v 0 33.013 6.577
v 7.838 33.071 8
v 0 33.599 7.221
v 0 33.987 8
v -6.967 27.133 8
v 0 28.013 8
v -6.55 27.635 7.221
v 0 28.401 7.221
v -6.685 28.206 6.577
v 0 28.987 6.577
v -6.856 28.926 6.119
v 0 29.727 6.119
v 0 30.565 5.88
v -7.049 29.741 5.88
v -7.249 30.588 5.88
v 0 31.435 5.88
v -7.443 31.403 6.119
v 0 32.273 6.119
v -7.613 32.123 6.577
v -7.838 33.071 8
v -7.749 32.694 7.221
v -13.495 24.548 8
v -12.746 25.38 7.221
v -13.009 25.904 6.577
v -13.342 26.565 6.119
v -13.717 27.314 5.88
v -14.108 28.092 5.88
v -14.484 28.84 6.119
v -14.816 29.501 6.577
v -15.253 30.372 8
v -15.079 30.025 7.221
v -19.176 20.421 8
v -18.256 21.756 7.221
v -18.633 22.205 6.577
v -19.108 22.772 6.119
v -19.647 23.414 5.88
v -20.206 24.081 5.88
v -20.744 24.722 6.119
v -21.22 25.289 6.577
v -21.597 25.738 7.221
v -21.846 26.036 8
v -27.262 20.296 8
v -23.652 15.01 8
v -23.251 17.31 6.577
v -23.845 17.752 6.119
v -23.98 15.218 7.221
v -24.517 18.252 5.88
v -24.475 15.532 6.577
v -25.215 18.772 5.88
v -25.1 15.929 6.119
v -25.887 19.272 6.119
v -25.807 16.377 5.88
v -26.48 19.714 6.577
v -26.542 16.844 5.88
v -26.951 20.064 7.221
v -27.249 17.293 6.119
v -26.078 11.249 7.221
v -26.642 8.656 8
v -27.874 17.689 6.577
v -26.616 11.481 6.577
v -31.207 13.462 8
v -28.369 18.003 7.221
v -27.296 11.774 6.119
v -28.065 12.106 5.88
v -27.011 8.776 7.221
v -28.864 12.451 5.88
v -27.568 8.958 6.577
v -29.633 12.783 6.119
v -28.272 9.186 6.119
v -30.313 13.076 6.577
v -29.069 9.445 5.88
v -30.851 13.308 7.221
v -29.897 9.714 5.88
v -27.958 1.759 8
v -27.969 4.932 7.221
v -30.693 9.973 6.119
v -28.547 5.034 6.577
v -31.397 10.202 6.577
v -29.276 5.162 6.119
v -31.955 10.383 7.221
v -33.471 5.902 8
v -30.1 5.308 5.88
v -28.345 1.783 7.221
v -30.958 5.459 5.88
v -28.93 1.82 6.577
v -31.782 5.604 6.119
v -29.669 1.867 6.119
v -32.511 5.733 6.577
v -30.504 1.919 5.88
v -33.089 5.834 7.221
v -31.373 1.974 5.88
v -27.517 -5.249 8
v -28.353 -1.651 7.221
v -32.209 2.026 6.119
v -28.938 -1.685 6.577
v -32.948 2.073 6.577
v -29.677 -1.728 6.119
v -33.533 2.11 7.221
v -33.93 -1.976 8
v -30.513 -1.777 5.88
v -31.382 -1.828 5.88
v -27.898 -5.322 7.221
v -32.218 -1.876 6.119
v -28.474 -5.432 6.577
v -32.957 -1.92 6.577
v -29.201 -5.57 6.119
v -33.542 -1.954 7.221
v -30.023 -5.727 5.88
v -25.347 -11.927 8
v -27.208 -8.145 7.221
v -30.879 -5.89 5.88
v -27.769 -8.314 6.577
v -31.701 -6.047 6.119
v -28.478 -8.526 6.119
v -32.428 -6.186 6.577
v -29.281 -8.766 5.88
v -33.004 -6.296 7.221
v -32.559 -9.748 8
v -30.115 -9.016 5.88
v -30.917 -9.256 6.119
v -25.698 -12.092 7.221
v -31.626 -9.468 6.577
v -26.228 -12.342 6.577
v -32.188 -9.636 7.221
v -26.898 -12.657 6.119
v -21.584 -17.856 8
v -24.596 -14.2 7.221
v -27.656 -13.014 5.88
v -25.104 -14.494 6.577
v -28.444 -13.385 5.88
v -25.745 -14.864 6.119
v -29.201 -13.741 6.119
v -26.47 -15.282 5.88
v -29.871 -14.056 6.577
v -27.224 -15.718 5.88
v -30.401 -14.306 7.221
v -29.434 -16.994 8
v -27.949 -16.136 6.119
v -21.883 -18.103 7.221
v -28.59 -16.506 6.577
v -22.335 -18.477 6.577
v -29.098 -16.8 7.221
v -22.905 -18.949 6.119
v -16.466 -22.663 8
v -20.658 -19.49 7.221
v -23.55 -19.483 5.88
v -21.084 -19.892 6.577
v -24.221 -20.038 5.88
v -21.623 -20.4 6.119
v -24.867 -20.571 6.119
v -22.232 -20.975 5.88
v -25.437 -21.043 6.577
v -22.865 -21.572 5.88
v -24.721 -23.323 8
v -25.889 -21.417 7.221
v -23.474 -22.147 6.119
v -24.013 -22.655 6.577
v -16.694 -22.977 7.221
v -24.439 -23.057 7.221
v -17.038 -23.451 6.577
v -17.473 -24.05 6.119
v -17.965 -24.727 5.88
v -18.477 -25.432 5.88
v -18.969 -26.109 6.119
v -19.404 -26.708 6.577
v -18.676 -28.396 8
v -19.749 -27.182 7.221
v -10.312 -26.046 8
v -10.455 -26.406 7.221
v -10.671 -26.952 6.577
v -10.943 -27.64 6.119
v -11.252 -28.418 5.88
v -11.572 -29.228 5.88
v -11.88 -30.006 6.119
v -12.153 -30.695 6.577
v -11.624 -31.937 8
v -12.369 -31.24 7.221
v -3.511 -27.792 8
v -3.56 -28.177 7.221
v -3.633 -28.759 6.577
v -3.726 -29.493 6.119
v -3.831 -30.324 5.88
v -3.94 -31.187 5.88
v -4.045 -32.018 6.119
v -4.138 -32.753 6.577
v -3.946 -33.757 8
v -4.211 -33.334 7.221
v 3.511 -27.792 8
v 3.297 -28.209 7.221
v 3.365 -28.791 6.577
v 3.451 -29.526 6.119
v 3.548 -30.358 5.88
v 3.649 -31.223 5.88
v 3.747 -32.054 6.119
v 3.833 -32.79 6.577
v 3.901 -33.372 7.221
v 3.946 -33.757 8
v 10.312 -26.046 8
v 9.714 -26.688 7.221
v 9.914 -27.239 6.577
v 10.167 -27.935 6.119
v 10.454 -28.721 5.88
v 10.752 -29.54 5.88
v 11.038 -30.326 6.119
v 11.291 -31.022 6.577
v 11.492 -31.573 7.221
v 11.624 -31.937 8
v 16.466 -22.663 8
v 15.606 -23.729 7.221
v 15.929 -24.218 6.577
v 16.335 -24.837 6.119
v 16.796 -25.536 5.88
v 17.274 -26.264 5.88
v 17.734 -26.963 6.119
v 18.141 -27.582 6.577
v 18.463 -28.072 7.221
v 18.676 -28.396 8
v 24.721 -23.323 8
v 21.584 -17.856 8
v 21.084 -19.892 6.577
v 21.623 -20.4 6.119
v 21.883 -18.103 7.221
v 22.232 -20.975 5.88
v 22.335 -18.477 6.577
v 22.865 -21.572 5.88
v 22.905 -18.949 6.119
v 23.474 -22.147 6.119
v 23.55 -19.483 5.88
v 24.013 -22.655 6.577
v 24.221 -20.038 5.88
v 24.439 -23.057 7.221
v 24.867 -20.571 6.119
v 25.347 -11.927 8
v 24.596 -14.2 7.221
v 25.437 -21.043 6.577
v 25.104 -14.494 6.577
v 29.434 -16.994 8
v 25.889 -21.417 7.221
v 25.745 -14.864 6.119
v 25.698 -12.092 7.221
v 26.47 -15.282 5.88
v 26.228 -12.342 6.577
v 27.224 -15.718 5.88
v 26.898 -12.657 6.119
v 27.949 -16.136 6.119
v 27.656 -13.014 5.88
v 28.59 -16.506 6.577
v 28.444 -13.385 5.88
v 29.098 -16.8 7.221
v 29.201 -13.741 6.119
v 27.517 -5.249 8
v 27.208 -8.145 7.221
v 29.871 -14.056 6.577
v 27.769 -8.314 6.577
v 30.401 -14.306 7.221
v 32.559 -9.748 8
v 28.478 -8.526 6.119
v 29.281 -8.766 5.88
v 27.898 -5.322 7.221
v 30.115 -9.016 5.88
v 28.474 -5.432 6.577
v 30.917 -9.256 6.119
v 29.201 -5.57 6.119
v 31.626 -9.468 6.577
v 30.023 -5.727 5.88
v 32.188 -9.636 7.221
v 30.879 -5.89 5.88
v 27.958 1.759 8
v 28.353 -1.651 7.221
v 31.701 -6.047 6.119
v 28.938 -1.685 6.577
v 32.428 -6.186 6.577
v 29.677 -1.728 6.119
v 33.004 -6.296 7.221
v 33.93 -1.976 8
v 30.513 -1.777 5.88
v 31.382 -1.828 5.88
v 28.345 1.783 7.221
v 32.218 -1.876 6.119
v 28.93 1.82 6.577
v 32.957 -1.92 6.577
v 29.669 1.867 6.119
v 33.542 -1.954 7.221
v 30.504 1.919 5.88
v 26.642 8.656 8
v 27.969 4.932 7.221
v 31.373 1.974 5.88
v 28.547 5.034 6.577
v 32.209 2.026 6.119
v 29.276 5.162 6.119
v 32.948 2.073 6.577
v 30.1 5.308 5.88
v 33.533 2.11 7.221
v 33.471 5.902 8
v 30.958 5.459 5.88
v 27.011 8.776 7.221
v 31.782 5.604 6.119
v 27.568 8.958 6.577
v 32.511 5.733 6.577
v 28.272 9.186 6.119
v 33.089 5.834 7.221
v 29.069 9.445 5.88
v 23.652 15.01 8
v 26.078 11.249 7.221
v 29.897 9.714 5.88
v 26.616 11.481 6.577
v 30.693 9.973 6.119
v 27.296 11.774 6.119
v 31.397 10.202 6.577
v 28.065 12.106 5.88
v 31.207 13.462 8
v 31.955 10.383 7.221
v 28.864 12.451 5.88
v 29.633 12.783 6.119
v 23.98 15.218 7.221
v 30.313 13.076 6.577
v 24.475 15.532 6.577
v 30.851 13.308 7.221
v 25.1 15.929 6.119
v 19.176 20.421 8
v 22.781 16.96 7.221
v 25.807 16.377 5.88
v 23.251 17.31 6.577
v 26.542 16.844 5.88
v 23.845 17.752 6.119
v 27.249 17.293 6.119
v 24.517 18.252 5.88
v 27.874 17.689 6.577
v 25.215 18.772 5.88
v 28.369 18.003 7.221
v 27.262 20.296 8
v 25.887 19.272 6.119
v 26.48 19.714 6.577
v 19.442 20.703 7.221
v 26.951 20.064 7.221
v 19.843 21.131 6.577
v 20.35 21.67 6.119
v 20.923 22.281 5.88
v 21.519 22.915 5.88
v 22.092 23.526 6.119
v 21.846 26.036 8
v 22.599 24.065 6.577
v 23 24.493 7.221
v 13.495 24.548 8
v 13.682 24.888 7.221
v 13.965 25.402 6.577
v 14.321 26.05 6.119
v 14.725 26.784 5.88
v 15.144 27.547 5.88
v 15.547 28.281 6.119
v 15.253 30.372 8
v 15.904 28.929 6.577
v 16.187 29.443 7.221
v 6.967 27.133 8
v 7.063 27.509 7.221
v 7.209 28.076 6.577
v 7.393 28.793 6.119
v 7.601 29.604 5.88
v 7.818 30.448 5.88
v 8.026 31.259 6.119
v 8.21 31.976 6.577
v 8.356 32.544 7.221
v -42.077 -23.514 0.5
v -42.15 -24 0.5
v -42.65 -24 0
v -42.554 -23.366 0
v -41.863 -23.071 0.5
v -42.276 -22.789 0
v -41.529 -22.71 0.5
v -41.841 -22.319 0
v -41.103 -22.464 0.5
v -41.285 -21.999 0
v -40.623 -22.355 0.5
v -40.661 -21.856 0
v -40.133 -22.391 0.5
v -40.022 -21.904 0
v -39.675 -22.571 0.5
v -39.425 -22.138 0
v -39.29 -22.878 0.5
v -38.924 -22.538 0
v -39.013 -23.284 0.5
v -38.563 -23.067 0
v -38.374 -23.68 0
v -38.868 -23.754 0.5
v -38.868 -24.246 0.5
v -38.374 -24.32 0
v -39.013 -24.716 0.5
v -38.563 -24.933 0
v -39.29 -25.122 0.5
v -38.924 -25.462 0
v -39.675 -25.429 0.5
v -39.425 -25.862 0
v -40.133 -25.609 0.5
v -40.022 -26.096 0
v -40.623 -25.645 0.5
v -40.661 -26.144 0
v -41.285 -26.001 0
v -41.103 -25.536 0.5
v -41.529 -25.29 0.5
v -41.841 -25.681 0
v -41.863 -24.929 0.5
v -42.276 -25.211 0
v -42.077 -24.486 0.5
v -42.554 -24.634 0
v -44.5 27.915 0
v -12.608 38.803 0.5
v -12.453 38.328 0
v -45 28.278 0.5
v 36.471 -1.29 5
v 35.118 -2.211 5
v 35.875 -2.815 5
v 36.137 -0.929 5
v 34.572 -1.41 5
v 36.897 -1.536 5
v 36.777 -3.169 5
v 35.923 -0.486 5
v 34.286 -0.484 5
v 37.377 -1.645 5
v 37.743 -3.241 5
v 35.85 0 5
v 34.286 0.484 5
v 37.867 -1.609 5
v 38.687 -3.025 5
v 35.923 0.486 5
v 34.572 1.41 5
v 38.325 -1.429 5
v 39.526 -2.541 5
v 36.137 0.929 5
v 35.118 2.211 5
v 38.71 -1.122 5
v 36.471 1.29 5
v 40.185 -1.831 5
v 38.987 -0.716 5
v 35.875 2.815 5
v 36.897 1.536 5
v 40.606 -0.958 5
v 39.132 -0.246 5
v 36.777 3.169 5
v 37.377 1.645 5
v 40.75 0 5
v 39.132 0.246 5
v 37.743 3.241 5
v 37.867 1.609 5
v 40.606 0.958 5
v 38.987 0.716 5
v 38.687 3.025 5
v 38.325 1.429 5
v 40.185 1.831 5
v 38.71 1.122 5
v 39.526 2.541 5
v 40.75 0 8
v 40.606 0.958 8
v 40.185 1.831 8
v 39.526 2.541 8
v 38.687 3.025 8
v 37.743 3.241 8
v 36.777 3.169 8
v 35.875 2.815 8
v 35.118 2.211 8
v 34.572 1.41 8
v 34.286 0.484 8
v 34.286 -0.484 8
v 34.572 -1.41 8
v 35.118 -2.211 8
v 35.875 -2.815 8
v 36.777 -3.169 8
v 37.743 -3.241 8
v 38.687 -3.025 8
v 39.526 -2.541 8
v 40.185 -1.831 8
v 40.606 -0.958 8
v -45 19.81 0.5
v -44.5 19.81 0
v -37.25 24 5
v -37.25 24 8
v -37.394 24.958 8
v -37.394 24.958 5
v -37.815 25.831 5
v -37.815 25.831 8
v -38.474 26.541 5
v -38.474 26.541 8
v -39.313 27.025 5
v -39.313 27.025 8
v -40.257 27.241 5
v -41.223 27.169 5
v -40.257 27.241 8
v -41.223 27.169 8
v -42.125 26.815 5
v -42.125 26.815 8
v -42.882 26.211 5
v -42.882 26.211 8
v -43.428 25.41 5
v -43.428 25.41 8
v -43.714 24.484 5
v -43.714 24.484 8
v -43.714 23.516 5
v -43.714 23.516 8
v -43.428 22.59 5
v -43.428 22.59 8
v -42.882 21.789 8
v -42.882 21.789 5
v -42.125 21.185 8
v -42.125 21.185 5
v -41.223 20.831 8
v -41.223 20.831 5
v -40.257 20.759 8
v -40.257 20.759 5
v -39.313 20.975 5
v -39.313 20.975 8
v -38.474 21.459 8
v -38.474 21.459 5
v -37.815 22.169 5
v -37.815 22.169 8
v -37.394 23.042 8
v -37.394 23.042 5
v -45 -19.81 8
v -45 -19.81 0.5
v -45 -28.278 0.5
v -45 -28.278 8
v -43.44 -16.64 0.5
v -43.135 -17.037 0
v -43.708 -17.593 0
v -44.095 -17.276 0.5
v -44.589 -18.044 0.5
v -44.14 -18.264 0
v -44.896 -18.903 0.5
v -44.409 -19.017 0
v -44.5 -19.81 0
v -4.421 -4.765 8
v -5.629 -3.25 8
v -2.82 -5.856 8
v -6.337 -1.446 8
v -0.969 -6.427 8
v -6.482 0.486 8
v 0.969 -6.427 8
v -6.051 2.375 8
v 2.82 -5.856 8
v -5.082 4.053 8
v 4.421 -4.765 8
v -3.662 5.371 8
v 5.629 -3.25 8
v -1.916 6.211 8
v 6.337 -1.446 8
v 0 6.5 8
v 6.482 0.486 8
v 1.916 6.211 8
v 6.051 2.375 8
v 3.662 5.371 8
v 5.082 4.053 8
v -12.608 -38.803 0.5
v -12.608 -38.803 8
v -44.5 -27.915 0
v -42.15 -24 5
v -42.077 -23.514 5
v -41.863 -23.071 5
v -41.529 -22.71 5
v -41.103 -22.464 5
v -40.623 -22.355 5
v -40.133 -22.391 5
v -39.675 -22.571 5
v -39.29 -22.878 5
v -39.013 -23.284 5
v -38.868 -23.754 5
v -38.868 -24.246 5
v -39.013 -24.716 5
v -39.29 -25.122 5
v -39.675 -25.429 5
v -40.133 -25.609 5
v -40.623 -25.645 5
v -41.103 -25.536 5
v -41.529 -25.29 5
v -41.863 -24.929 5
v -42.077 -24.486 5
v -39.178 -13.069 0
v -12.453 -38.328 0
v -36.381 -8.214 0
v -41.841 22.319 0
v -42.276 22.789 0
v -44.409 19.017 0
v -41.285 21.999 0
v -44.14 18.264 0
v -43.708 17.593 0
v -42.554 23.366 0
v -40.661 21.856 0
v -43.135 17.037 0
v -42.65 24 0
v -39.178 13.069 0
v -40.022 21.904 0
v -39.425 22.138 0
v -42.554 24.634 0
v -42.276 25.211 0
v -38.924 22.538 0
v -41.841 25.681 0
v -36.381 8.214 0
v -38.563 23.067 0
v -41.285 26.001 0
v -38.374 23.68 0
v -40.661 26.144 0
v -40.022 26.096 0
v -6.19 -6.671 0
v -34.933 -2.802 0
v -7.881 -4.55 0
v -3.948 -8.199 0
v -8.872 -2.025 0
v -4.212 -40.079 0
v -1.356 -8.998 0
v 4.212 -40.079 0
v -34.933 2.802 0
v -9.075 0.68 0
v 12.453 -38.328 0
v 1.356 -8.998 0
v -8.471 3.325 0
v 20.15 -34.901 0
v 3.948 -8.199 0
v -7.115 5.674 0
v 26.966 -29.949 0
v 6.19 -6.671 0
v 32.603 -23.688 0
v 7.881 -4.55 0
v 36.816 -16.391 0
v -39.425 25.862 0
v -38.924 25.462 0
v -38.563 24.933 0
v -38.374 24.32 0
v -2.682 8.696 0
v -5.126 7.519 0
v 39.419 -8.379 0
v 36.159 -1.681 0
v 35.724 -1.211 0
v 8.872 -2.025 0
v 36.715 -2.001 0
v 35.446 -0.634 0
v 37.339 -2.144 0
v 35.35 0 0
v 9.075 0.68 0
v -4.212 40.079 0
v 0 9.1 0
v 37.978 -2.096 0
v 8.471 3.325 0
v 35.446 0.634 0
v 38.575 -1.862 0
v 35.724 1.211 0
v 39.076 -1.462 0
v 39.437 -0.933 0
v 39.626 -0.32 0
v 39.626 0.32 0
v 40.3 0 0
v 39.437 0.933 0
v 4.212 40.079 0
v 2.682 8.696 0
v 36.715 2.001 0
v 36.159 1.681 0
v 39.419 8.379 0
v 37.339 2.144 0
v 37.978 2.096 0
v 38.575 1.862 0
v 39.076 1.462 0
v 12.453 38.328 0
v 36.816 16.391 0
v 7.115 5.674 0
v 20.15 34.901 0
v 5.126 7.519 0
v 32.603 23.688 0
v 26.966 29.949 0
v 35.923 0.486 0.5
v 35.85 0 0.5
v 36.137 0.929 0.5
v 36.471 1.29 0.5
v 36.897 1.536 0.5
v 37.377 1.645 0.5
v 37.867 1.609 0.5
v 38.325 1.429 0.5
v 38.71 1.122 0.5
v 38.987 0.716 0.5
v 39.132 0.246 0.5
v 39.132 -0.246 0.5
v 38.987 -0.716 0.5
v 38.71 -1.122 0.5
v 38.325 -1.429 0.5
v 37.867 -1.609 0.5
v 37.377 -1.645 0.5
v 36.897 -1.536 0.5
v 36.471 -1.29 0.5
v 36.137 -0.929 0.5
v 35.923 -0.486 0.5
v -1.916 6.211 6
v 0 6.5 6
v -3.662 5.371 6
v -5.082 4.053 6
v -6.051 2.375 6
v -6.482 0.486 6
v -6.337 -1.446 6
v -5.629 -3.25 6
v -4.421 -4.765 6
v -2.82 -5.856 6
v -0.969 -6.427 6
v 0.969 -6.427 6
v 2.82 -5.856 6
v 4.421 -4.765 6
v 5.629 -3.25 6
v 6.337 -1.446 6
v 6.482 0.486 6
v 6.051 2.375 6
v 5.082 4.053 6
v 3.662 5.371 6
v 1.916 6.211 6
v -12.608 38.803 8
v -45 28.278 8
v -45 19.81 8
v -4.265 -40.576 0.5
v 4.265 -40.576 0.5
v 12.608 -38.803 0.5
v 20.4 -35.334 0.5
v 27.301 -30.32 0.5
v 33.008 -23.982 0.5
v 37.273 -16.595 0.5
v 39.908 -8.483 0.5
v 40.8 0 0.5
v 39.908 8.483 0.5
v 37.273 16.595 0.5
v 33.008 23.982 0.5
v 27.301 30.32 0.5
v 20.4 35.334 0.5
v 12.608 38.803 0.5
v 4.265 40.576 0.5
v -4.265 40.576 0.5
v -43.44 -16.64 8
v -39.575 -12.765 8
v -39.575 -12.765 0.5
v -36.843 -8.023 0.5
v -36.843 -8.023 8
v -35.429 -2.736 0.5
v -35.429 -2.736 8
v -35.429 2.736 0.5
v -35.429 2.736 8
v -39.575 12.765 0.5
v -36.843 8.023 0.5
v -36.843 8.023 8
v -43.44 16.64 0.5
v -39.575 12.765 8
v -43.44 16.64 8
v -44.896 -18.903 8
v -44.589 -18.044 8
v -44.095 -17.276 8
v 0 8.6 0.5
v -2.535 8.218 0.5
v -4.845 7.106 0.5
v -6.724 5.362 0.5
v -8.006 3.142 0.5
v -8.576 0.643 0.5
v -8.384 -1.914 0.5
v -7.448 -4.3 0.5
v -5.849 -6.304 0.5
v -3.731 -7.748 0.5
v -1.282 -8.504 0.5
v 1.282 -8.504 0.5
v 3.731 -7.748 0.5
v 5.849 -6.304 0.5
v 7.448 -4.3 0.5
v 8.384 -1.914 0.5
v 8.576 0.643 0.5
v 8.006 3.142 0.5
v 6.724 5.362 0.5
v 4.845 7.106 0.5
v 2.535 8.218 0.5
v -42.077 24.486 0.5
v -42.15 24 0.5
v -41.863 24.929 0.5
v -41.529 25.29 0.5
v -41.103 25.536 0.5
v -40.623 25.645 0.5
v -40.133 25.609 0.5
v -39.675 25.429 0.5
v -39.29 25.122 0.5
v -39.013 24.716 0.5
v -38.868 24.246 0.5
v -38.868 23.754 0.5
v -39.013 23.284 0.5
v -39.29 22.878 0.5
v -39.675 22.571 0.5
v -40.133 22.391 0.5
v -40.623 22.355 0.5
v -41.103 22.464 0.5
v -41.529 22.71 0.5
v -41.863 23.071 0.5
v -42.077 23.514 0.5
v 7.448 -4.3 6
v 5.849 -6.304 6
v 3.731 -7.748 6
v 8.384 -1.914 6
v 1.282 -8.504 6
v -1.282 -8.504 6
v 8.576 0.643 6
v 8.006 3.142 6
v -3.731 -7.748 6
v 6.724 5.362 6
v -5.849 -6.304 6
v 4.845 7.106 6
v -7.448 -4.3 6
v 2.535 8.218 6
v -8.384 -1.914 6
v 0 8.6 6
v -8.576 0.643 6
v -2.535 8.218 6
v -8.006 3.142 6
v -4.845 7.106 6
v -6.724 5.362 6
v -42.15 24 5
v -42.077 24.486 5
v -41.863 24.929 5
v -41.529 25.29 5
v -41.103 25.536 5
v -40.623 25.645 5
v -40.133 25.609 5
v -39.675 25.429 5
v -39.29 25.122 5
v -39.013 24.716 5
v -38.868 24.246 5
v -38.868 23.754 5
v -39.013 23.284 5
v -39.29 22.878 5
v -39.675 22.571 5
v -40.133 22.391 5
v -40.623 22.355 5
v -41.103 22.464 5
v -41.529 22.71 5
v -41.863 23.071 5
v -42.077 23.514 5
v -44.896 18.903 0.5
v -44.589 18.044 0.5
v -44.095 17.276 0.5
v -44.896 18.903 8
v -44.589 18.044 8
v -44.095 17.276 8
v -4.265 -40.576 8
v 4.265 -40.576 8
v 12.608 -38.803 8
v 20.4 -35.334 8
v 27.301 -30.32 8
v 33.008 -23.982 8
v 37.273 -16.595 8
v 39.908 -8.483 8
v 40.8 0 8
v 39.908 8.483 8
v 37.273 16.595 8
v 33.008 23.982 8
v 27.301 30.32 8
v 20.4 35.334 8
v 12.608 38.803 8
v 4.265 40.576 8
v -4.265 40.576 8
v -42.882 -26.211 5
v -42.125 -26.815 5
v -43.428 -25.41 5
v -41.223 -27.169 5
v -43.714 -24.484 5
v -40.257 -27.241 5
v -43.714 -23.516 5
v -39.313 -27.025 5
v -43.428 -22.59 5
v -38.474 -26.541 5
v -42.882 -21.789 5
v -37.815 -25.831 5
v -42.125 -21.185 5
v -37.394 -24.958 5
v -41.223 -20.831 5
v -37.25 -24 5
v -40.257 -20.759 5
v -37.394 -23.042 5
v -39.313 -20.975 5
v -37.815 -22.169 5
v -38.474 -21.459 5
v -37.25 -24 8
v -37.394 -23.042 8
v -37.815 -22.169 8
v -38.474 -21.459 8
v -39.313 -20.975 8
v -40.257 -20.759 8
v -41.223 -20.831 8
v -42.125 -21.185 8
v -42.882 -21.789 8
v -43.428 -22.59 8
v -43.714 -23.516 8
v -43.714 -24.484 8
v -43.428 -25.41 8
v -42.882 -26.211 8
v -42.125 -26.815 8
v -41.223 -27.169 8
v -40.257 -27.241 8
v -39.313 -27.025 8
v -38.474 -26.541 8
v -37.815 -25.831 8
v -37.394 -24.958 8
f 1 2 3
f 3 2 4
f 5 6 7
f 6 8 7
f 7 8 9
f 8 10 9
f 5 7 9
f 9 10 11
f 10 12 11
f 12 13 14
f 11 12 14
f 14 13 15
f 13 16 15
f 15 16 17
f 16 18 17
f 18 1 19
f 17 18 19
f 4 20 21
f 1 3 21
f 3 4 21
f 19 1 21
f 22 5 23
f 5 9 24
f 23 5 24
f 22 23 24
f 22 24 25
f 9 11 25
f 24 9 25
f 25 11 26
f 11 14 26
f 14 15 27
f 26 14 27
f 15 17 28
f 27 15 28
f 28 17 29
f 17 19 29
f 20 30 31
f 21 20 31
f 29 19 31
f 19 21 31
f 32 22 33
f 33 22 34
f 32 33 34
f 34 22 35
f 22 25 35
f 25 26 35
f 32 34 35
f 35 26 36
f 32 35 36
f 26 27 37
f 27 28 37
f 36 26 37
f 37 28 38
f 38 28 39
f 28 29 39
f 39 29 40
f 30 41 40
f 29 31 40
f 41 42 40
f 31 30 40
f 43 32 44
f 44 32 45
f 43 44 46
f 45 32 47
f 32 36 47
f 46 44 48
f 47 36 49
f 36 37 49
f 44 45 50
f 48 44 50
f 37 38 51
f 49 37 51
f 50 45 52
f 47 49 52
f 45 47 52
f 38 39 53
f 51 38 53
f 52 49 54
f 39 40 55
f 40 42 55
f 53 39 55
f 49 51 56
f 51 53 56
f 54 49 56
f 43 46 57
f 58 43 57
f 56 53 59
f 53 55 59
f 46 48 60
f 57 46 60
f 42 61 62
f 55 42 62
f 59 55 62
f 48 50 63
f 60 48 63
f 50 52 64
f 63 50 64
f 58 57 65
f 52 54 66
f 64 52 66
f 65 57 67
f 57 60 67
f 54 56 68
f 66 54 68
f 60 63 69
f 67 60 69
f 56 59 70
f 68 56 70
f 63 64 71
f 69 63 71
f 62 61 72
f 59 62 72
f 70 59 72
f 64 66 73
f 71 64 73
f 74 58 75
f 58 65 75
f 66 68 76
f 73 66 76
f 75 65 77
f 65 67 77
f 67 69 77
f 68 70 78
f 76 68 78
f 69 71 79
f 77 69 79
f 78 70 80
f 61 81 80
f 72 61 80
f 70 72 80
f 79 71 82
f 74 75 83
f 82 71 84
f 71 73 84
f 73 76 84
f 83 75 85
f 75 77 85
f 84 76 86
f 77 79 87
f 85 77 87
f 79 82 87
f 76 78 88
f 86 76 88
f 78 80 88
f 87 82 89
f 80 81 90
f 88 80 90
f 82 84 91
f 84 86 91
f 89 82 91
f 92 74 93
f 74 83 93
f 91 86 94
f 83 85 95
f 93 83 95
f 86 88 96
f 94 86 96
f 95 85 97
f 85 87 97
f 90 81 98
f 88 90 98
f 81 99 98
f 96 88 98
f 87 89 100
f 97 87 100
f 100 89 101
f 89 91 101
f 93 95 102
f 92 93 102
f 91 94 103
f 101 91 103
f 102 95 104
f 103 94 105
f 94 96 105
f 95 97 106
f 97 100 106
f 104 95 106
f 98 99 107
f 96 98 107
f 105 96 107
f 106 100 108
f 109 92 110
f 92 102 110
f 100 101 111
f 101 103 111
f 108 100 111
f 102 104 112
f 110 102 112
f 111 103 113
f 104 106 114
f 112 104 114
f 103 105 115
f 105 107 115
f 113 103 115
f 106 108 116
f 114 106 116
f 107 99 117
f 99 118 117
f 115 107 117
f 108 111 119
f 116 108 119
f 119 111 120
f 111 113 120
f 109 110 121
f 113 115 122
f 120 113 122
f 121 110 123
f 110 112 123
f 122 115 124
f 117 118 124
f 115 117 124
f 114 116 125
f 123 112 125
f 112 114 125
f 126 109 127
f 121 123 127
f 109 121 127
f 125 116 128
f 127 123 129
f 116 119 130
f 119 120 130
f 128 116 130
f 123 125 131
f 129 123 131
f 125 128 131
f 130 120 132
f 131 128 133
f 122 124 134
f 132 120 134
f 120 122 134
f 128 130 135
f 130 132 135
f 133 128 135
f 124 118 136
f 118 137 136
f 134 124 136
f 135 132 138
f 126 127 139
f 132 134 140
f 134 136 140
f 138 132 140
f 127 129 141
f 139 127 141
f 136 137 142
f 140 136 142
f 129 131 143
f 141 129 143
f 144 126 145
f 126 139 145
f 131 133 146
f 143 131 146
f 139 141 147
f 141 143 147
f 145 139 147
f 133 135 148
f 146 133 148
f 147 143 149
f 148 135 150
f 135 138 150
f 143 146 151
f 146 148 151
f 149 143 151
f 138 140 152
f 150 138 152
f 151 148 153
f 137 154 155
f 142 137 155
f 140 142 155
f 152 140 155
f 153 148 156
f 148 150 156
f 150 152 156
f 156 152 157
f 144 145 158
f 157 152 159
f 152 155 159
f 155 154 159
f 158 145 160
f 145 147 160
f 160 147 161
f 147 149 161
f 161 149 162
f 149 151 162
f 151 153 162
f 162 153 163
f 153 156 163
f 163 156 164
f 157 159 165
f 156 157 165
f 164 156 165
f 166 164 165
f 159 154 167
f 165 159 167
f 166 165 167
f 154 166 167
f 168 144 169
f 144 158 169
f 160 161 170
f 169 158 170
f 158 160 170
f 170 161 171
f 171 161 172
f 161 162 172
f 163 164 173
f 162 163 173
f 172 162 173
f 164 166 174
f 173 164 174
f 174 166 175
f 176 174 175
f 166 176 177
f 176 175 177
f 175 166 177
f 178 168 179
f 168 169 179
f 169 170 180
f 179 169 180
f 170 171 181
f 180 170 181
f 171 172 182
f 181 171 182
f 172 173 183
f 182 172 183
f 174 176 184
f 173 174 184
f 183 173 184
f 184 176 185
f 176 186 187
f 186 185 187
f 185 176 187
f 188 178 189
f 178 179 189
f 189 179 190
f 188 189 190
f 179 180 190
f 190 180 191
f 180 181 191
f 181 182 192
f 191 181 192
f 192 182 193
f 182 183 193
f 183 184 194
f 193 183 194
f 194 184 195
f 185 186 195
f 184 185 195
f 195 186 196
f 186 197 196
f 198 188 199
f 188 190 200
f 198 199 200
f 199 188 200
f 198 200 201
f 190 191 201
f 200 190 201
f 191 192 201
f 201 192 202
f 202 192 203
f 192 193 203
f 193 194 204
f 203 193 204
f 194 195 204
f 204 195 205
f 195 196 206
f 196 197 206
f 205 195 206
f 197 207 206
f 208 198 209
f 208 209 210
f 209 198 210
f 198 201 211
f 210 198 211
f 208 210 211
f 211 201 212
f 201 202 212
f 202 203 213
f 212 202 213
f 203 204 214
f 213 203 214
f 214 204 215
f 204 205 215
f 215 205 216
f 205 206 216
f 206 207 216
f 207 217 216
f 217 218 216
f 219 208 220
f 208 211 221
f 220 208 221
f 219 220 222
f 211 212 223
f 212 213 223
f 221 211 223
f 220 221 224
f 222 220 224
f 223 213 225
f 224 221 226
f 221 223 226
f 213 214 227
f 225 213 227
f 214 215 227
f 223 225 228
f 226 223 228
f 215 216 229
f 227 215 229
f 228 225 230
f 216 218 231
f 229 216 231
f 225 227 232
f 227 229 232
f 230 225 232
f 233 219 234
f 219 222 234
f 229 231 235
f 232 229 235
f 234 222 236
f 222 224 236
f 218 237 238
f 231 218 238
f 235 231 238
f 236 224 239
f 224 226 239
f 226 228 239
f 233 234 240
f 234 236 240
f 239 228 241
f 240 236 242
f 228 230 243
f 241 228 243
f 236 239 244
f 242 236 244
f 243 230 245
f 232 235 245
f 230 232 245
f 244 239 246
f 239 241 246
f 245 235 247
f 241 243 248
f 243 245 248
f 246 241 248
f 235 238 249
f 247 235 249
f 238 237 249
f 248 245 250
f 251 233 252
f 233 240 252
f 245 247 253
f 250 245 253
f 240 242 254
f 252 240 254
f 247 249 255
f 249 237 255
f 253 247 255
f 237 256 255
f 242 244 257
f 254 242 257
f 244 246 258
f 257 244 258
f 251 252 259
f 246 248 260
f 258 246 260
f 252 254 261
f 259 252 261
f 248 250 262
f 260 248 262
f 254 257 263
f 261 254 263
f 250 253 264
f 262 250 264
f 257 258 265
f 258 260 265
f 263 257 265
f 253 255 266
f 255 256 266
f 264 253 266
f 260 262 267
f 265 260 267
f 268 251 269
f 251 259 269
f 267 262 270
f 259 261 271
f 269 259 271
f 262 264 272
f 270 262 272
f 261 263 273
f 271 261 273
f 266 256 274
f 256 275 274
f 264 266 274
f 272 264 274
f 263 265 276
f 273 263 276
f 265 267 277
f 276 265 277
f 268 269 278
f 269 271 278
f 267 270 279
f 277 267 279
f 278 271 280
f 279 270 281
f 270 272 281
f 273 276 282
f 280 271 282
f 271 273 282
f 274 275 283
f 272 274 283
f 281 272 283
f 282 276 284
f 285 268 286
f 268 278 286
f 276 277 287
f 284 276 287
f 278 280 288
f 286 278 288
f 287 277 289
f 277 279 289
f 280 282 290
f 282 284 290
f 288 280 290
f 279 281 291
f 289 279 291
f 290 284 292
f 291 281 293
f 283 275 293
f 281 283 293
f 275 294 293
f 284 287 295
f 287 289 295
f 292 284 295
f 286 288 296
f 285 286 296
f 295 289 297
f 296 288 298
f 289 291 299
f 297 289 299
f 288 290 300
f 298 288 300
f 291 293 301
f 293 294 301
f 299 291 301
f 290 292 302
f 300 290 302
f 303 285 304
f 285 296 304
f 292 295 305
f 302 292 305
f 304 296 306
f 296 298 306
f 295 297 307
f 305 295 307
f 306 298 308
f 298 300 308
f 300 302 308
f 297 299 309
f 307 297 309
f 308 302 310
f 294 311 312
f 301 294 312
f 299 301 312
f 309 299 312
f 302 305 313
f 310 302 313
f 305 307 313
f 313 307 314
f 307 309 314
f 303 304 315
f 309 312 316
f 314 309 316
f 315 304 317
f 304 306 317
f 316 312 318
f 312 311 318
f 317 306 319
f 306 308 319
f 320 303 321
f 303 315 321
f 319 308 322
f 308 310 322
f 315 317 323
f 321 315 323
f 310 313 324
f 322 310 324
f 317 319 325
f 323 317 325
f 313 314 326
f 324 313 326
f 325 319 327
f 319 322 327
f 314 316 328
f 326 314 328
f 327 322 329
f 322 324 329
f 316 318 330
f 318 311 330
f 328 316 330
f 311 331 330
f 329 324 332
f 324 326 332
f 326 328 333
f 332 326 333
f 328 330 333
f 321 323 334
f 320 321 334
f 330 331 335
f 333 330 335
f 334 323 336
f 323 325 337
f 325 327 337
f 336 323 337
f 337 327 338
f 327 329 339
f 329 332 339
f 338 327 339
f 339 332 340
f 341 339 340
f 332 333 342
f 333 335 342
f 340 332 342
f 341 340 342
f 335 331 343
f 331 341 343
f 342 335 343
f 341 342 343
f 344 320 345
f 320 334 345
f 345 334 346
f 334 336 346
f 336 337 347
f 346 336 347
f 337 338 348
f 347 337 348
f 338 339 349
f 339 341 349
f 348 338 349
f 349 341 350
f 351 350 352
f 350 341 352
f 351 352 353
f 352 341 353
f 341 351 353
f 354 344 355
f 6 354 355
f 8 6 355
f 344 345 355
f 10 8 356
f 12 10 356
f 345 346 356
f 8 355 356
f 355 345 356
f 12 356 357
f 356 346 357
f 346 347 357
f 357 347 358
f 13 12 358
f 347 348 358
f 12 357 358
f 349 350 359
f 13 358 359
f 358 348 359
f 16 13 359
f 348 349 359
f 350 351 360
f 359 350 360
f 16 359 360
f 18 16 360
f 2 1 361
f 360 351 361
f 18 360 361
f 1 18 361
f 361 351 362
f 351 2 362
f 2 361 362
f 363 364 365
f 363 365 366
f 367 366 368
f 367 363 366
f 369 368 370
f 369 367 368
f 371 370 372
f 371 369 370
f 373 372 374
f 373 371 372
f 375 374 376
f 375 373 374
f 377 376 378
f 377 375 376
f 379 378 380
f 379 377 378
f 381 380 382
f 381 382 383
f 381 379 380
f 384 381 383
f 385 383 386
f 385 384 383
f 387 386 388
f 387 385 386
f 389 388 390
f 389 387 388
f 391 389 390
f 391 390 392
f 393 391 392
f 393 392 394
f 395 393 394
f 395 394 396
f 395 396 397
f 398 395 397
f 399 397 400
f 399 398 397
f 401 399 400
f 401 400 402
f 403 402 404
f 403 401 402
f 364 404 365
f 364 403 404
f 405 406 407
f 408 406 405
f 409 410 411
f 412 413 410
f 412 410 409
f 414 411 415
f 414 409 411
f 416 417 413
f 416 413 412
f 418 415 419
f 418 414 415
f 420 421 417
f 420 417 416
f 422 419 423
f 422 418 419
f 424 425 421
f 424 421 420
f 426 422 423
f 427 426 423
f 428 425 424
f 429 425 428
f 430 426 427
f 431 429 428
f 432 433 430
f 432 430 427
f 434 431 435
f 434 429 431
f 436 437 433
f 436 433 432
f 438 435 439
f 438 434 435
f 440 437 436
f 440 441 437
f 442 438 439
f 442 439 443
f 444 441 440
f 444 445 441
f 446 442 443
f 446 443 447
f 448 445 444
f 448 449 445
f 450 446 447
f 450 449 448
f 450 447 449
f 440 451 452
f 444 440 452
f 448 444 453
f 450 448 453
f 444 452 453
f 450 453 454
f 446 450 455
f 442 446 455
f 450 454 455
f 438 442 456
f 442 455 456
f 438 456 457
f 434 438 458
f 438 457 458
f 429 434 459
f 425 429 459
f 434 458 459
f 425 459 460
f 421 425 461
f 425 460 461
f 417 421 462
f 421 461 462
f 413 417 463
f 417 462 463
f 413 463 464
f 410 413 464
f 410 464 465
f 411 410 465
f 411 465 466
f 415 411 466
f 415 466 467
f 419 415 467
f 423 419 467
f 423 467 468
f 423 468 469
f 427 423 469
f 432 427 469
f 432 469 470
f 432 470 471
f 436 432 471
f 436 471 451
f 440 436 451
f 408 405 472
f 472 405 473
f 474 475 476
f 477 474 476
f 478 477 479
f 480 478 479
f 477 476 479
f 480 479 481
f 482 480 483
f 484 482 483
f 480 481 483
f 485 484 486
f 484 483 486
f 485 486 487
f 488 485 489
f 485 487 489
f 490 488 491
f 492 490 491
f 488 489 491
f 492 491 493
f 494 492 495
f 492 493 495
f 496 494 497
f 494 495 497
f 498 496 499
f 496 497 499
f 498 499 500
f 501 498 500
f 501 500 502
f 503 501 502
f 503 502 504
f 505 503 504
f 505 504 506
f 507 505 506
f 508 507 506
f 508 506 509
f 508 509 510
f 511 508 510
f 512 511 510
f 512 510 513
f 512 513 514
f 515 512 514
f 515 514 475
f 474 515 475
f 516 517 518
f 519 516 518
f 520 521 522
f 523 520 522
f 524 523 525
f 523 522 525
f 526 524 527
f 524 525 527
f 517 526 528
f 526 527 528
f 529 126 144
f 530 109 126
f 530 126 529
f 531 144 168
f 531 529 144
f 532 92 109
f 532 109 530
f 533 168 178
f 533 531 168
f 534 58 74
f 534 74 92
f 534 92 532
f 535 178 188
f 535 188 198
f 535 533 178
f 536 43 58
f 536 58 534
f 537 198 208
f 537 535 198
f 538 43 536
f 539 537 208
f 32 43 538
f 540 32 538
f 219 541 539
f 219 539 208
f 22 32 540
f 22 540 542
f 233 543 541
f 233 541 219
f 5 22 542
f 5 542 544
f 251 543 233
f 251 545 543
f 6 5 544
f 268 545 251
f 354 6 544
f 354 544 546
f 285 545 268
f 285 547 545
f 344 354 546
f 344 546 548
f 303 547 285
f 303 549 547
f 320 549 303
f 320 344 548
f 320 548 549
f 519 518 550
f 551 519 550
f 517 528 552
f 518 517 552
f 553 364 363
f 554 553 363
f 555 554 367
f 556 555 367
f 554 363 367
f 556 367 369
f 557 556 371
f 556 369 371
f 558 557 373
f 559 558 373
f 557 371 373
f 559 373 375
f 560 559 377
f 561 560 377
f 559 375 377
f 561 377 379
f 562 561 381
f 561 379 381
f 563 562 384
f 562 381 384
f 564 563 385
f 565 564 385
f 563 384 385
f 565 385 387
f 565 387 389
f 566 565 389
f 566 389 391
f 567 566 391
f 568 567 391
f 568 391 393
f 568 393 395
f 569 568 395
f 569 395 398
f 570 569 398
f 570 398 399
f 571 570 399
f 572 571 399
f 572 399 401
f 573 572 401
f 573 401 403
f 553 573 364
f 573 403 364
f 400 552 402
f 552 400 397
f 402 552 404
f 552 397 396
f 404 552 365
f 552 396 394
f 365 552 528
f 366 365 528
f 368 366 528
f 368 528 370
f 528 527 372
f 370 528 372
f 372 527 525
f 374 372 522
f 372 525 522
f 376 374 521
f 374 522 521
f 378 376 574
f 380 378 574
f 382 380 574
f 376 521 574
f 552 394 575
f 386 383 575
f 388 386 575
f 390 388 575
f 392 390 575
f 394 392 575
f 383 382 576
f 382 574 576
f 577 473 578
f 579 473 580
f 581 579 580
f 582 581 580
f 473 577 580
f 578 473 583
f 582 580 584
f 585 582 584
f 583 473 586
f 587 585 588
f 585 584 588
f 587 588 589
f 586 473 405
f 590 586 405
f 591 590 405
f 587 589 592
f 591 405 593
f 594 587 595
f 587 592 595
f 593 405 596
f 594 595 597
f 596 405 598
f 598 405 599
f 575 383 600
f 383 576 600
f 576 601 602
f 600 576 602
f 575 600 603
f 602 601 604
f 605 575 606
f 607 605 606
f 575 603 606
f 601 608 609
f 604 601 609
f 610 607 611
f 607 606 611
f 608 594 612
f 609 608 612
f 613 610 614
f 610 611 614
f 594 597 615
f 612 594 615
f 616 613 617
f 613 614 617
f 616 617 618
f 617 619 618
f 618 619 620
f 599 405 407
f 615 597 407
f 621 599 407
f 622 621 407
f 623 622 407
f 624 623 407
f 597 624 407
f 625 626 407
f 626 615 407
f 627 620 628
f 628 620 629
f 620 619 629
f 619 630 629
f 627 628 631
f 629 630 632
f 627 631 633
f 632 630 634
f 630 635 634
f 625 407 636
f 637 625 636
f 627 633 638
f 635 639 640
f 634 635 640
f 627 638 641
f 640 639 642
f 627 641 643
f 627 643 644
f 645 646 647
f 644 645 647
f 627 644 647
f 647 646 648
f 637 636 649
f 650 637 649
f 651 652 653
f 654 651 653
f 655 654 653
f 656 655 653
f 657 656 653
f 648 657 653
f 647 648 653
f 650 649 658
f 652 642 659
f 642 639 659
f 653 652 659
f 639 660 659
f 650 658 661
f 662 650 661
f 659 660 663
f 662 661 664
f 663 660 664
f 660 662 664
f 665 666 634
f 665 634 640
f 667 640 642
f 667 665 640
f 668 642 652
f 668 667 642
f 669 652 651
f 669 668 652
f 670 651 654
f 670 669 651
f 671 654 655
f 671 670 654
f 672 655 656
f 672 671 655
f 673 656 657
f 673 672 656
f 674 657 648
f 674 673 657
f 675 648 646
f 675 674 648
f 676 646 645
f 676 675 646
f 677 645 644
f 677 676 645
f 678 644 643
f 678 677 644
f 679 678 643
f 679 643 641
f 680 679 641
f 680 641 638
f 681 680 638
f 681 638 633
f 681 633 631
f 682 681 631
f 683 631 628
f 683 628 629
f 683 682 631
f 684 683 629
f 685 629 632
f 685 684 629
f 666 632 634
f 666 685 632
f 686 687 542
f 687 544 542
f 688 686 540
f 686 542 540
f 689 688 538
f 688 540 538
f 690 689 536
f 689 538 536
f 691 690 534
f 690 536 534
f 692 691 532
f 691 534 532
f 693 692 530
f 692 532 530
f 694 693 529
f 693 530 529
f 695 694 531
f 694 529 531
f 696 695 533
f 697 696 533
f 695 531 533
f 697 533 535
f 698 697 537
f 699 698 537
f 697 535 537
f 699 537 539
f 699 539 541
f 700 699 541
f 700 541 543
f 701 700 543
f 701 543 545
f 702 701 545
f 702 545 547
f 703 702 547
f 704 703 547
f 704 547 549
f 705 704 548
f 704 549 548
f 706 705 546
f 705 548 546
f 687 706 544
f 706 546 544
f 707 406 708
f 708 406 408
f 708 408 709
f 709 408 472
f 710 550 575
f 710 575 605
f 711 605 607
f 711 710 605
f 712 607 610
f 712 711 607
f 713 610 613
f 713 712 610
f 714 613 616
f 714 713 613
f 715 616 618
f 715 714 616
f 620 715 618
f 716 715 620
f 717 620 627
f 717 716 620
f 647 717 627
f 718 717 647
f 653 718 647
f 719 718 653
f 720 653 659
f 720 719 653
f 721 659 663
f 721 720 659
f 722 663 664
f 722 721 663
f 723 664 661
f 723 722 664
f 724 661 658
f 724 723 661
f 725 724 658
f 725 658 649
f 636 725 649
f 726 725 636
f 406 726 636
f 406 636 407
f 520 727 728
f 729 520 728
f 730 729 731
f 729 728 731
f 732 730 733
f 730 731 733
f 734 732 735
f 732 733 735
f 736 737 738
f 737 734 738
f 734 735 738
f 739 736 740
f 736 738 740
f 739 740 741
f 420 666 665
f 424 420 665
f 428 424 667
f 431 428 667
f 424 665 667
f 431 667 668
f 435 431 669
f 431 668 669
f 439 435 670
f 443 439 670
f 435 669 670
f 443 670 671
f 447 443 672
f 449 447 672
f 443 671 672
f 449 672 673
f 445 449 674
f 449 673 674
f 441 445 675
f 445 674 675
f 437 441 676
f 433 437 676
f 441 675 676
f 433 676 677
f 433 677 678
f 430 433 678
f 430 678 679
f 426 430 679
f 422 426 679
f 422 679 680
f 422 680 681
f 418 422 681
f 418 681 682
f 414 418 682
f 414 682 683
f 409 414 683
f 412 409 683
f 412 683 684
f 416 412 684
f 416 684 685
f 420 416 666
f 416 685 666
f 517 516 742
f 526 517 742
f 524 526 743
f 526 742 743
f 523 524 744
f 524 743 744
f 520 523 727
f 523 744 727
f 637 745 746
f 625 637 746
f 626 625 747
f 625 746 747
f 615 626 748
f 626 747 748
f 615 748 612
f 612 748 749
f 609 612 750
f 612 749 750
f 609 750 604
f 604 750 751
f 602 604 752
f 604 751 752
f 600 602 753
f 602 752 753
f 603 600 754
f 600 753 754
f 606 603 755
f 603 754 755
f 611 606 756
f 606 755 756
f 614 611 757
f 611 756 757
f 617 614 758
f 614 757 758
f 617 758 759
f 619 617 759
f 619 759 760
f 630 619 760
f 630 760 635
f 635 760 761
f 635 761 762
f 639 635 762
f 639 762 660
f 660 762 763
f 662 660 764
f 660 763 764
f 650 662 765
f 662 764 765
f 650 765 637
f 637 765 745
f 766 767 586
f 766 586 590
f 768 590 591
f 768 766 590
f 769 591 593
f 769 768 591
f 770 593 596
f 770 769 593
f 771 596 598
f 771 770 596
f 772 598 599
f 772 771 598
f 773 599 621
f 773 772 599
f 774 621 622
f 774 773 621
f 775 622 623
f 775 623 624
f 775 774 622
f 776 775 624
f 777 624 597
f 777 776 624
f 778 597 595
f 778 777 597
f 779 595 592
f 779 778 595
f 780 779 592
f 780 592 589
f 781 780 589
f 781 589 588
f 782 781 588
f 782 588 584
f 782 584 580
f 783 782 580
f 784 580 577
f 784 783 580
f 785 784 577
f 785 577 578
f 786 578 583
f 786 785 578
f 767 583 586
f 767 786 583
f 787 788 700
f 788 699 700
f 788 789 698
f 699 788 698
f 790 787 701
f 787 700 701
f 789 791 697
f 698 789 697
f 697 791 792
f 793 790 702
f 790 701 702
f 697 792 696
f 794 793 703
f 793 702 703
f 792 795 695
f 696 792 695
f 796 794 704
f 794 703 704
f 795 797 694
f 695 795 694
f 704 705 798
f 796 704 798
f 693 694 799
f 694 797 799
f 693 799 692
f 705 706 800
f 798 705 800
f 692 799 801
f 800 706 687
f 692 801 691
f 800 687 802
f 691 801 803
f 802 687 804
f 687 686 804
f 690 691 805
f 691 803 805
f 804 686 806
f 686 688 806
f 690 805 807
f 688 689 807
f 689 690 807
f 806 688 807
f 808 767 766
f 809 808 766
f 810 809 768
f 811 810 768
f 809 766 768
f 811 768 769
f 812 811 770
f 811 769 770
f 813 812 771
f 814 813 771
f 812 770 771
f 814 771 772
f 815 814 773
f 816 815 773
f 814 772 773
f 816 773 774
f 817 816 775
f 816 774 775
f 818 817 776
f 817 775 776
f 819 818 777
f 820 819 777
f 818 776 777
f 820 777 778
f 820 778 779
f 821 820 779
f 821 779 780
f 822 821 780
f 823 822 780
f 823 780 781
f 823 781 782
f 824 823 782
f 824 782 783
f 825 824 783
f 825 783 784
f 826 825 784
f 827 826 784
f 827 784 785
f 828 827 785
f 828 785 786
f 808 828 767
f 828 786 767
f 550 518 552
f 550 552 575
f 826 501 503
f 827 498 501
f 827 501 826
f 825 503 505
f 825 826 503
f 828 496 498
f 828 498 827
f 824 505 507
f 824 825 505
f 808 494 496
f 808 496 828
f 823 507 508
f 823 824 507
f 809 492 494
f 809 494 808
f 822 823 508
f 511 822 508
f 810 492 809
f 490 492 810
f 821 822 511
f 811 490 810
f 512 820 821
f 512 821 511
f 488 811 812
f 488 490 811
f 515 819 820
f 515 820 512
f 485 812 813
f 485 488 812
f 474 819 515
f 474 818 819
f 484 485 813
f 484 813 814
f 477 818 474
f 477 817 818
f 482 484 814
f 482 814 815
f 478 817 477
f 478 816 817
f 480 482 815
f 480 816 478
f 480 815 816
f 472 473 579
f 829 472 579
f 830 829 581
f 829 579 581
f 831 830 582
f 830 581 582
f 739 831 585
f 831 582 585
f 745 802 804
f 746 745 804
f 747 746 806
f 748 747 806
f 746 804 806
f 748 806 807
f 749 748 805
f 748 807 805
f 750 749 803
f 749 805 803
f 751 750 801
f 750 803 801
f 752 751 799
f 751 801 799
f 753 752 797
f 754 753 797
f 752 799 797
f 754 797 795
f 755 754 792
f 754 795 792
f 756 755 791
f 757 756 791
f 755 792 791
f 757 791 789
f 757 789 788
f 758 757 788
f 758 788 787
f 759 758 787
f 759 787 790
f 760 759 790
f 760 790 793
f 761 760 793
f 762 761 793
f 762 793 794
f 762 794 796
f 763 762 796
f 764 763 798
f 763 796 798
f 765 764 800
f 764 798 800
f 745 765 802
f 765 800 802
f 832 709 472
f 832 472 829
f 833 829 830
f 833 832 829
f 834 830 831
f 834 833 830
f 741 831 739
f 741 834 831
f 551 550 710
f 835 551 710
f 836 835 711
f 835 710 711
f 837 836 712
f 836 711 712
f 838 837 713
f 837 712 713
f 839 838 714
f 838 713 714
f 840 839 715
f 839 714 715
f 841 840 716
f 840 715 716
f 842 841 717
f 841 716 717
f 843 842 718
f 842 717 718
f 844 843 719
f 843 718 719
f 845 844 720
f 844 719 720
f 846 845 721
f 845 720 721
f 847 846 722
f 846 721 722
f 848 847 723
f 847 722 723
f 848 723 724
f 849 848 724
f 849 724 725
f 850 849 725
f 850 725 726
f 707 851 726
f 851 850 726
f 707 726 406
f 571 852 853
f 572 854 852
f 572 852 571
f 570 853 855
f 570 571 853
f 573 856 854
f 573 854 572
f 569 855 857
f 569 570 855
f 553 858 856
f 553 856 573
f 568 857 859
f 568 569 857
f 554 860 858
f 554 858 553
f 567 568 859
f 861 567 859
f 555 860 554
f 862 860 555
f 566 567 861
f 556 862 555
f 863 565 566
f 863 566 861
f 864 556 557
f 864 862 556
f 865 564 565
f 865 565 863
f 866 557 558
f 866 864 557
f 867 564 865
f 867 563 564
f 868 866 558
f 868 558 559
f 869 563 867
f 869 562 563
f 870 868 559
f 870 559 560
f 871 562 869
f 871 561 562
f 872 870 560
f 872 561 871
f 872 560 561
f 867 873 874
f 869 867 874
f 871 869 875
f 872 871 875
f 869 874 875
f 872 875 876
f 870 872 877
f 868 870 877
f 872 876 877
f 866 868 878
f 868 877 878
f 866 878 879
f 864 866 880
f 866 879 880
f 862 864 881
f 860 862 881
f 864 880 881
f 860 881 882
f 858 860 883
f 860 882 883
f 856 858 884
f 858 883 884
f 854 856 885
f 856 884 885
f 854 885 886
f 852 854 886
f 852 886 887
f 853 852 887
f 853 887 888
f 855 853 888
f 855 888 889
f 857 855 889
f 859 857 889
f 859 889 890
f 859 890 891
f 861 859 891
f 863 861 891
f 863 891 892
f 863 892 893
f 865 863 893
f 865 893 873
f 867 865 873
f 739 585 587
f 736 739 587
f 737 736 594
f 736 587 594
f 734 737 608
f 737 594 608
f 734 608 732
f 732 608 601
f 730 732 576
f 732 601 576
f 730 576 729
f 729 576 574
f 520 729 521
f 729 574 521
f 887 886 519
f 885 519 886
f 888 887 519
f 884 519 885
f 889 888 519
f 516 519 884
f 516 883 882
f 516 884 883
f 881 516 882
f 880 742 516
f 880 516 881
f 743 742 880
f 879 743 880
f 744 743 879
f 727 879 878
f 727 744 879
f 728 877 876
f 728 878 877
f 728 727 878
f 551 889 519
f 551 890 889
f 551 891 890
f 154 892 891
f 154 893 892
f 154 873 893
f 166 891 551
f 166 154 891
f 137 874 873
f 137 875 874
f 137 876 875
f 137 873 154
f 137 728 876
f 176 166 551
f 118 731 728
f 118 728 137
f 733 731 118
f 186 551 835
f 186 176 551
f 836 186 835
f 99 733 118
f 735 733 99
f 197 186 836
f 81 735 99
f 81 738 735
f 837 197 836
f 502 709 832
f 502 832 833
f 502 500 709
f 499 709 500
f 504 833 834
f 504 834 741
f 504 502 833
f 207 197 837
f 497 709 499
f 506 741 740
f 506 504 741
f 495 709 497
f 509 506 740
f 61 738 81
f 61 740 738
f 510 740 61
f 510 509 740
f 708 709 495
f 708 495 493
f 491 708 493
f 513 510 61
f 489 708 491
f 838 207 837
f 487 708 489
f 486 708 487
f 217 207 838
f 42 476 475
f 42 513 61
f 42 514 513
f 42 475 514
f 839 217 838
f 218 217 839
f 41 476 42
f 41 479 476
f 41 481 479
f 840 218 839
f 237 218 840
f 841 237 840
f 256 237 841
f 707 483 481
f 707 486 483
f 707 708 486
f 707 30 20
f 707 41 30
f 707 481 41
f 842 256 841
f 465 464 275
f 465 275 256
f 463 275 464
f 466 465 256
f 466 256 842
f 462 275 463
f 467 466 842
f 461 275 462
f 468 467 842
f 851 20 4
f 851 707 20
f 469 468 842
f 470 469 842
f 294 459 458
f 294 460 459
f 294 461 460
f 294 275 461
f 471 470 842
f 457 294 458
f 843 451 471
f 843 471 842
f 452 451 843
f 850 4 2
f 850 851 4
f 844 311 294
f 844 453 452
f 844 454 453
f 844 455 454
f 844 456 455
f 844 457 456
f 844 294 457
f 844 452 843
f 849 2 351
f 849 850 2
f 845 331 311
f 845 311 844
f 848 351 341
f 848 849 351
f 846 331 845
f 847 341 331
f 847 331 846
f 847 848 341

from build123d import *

# Parameters (mm, degrees)
F0_R            = 40.8
F1_DEPTH        = 8
F4_R            = 3.15
F6_W            = 4.8
F6_H            = 38.4
F7_DEPTH        = 8.001
F9_DEPTH        = 8
F10_R           = 21
F11_DEPTH       = 8.001
F12_R           = 4
F14_D           = 3.3
F14_CBORE_D     = 6.5
F14_CBORE_DEPTH = 3
F15_SIZE        = 0.5


with BuildPart() as f1:
    # F0 (on Top) → F1 (new body)
    with BuildSketch(Plane.XY):
        Circle(F0_R)
    extrude(amount=F1_DEPTH)

    # F2 (on Right) → F3 (revolve, cut)
    with BuildSketch(Plane.YZ):
        Polygon((0, 8), (0, 0), (8.6, 0), (8.6, 6), (6.5, 6), (6.5, 8), align=None)
    revolve(axis=Axis((0, 0, 10.7360328796), (0, 0, 1)), mode=Mode.SUBTRACT)

    # F4 (on Right) → F5 (revolve, cut)
    with BuildSketch(Plane.YZ):
        with Locations((31, 9)):
            Circle(F4_R)
    revolve(axis=Axis((0, 0, 6.3867427816), (0, 0, 1)), mode=Mode.SUBTRACT)

    # F6 (on Top) → F7 (cut, through all)
    with BuildSketch(Plane.XY):
        with Locations((-38.4, 0)):
            Rectangle(F6_W, F6_H)
    extrude(amount=F7_DEPTH, mode=Mode.SUBTRACT)

    # F8 (on Top) → F9 (join, through all)
    with BuildSketch(Plane.XY):
        with BuildLine():
            Line((-45, 28.2782724184), (-45, -28.2782724184))
            Line((-45, -28.2782724184), (-12.6078933705, -38.8031058648))
            ThreePointArc((-12.6078933705, -38.8031058648), (-26.2059585661, -31.2711965814), (-36, -19.2))
            Line((-36, -19.2), (-36, 19.2))
            ThreePointArc((-36, 19.2), (-26.2059585661, 31.2711965814), (-12.6078933705, 38.8031058648))
            Line((-12.6078933705, 38.8031058648), (-45, 28.2782724184))
        make_face()
    extrude(amount=F9_DEPTH)

    # F10 (on face) → F11 (cut, through all)
    with BuildSketch(Plane.XY.offset(8)):
        with Locations((-56.25, 0)):
            Circle(F10_R)
    extrude(amount=-F11_DEPTH, mode=Mode.SUBTRACT)

    # F12
    f12_edges = [f1.edges().sort_by_distance(p)[0] for p in [
        (-45, -17.732386, 4),
        (-45, 17.732386, 4),
    ]]
    fillet(f12_edges, radius=F12_R)

    # F14 (through all)
    with Locations(Plane.XY.offset(8)):
        with Locations((-40.5, 24), (-40.5, -24), (37.5, 0)):
            CounterBoreHole(F14_D / 2, F14_CBORE_D / 2, F14_CBORE_DEPTH)

    # F15
    f15_edges = [f1.edges().sort_by_distance(p)[0] for p in [
        (-45, 24.044154, 0),
        (-44.588872, 18.043683, 0),
        (-28.803947, 33.540689, 0),
        (-35.25, 0, 0),
        (40.8, 0, 0),
        (-44.588872, -18.043683, 0),
        (-28.803947, -33.540689, 0),
        (-45, -24.044154, 0),
        (-42.15, -24, 0),
        (-42.15, 24, 0),
        (0, -8.6, 0),
        (35.85, 0, 0),
    ]]
    chamfer(f15_edges, length=F15_SIZE)


solid = f1.part
